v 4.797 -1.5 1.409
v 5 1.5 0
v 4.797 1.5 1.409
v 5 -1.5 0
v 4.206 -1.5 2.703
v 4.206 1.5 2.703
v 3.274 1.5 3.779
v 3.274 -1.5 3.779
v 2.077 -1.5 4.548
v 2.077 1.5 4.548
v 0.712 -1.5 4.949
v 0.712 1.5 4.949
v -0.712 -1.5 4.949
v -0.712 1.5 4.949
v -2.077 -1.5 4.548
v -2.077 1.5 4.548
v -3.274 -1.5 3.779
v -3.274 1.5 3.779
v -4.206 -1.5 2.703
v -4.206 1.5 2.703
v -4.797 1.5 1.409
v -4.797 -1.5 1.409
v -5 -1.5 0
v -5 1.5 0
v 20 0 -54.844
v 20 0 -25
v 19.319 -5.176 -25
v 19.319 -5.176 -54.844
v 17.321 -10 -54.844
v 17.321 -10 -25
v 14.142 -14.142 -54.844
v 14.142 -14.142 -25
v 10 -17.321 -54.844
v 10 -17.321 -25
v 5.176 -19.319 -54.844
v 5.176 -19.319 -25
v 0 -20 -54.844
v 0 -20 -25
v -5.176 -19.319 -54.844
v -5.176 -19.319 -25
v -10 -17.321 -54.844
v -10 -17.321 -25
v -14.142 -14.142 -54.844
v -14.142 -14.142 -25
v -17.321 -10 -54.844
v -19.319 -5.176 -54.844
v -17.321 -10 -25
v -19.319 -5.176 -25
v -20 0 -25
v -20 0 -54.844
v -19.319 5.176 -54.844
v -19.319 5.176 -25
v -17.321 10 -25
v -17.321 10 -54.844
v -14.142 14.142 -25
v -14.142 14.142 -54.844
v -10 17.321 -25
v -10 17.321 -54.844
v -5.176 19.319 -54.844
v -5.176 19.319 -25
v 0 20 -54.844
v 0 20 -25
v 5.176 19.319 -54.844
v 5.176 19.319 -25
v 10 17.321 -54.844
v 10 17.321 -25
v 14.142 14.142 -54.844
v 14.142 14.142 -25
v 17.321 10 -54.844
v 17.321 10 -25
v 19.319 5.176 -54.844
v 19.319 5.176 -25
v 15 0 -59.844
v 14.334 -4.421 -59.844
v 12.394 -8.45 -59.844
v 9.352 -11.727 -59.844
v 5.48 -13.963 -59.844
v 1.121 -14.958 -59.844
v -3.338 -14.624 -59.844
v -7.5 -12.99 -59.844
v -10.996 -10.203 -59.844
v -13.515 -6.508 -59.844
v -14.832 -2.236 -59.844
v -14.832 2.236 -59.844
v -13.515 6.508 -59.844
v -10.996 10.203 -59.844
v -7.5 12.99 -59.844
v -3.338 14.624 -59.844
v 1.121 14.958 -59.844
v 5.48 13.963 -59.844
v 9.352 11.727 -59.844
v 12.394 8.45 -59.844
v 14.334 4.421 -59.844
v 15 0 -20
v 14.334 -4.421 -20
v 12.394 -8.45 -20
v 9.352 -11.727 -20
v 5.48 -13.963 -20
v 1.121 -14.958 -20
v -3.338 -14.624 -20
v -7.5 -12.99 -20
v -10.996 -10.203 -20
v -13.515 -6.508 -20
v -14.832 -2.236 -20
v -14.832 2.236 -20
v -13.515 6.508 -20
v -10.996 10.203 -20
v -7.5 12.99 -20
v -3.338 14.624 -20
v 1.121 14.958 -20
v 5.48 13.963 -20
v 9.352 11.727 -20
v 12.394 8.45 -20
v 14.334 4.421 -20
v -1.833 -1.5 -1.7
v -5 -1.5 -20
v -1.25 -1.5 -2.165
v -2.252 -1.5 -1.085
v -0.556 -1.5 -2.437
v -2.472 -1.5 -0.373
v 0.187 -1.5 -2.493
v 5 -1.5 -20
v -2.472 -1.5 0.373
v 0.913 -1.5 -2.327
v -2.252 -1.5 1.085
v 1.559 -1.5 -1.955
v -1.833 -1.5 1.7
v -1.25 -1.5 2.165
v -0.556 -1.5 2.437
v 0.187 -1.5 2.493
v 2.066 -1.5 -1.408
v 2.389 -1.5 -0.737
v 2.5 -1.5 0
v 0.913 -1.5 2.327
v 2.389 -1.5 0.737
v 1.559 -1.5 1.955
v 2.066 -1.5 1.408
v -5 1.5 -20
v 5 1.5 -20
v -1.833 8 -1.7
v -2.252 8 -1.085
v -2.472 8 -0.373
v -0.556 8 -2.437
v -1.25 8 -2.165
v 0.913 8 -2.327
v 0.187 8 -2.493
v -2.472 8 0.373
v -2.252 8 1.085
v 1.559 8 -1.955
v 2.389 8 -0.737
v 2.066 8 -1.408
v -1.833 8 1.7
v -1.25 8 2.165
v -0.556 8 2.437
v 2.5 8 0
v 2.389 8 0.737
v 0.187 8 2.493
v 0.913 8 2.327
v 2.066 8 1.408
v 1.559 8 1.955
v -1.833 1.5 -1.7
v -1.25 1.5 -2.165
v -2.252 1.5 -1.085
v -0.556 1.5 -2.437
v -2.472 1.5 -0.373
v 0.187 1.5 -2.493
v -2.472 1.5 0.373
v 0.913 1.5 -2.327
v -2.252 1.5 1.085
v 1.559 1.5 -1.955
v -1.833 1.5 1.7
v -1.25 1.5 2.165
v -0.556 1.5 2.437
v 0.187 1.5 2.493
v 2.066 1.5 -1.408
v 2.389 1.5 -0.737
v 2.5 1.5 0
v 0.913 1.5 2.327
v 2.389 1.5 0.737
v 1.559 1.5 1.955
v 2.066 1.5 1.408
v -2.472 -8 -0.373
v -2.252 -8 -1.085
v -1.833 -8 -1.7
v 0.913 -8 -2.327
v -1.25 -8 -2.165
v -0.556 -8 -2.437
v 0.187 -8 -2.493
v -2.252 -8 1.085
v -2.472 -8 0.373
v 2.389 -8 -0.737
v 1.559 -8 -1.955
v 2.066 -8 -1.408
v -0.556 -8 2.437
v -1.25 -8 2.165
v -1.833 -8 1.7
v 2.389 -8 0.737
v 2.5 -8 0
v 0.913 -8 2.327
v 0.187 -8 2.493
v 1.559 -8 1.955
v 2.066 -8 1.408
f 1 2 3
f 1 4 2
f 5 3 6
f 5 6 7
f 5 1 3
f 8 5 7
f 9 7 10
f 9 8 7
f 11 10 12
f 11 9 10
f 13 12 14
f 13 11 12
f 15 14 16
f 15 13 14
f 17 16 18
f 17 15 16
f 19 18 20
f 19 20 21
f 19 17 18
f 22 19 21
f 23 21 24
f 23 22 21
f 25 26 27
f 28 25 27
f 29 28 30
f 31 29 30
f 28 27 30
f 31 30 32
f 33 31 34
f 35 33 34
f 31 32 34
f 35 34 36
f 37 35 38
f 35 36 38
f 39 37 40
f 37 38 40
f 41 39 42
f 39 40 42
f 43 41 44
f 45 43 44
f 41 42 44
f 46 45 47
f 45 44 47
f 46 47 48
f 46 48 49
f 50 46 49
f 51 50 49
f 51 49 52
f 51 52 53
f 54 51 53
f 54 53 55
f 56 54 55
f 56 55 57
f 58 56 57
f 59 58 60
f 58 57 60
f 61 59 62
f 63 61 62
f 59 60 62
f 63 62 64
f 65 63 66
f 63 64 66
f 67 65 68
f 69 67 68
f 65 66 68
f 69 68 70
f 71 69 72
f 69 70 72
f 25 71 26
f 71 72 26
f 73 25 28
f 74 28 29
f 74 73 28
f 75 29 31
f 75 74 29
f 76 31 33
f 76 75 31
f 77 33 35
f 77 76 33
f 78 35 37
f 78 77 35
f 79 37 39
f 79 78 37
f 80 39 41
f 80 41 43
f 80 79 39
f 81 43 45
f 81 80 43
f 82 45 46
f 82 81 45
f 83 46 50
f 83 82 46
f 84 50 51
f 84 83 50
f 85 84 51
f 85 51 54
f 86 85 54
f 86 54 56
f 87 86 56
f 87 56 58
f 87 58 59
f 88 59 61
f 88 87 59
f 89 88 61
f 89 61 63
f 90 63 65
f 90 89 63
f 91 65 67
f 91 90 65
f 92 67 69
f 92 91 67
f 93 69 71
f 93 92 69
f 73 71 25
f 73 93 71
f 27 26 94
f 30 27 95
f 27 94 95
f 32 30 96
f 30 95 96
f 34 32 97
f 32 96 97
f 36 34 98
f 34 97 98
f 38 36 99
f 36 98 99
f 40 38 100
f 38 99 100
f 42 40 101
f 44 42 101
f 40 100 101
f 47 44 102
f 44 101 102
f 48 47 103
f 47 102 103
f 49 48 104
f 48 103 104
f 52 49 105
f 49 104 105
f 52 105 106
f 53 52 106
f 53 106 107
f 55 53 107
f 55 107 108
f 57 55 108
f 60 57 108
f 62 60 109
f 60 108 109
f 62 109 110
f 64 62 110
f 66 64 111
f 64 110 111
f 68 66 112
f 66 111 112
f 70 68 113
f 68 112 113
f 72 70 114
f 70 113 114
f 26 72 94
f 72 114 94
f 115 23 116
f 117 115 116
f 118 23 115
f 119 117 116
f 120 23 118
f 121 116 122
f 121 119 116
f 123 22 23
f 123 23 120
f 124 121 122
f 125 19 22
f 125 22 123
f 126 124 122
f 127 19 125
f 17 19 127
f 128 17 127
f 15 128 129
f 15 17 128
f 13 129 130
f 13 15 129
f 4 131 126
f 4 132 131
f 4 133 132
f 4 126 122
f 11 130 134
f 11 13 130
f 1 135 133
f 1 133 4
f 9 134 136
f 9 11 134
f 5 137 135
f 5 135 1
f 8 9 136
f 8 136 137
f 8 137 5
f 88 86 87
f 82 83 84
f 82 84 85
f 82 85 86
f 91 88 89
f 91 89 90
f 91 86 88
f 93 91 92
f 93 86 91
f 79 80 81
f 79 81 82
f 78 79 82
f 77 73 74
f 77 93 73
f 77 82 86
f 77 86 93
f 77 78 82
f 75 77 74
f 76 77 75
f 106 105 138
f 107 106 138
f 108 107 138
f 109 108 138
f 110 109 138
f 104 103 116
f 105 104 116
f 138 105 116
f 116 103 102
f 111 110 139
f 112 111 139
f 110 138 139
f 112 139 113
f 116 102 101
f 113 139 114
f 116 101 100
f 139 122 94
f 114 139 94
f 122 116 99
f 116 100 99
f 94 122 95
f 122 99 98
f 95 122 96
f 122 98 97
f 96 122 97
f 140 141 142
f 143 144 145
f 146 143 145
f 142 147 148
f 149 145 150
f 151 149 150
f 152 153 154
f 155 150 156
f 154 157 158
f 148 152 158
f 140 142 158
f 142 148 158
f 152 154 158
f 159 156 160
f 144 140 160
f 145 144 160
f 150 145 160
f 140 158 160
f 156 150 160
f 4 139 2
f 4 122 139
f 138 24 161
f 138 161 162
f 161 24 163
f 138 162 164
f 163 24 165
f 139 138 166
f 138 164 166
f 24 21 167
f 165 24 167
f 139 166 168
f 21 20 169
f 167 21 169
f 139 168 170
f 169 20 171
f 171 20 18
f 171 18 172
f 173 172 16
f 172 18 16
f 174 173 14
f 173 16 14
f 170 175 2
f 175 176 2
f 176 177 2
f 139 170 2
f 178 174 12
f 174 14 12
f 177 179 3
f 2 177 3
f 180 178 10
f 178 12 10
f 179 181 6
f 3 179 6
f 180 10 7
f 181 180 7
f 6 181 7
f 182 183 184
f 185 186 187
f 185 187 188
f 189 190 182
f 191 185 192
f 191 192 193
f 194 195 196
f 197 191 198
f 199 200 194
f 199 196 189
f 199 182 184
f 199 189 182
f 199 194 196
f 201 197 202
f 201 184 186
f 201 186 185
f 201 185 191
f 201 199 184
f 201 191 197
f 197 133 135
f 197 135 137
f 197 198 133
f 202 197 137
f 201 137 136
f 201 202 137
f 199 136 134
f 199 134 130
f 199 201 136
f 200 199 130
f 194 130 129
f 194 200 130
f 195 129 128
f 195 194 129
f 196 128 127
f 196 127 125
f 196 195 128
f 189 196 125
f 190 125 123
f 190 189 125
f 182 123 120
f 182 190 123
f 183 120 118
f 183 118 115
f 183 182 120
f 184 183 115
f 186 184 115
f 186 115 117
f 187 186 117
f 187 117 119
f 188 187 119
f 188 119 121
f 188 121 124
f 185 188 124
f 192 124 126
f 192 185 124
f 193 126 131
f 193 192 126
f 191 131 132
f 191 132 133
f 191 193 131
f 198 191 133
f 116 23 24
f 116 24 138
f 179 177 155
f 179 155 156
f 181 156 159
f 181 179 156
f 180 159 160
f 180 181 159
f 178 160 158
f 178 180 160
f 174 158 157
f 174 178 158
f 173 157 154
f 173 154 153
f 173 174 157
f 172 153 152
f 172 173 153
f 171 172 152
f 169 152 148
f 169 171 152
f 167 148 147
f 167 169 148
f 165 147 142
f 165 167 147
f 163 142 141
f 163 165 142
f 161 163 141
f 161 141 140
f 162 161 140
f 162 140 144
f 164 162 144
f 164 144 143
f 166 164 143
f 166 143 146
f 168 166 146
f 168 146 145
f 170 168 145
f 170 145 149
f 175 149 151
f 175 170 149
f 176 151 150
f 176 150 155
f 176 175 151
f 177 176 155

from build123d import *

# Parameters (mm, degrees)
F0_R     = 2.5
F1_DEPTH = 8
F3_DEPTH = 1.5
F4_R     = 20
F5_DEPTH = 39.84388
F6_SIZE  = 5


with BuildPart() as f1:
    # F0 (on Front) → F1 (new body, symmetric)
    with BuildSketch(Plane.XZ):
        Circle(F0_R)
    extrude(amount=F1_DEPTH, both=True)

    # F2 (on Front) → F3 (join, symmetric)
    with BuildSketch(Plane.XZ):
        with BuildLine():
            ThreePointArc((5, 0), (0, 5), (-5, 0))
            Line((-5, 0), (-5, -20))
            Line((-5, -20), (5, -20))
            Line((5, -20), (5, 0))
        make_face()
    extrude(amount=F3_DEPTH, both=True)

    # F4 (on face) → F5 (join)
    with BuildSketch(Plane(origin=(0, 0, -20), x_dir=(1, 0, 0), z_dir=(0, 0, -1))):
        Circle(F4_R)
    extrude(amount=F5_DEPTH)

    # F6
    f6_edges = [f1.edges().sort_by_distance(p)[0] for p in [
        (-20, 0, -20),
        (-20, 0, -59.84388),
    ]]
    chamfer(f6_edges, length=F6_SIZE)


solid = f1.part
